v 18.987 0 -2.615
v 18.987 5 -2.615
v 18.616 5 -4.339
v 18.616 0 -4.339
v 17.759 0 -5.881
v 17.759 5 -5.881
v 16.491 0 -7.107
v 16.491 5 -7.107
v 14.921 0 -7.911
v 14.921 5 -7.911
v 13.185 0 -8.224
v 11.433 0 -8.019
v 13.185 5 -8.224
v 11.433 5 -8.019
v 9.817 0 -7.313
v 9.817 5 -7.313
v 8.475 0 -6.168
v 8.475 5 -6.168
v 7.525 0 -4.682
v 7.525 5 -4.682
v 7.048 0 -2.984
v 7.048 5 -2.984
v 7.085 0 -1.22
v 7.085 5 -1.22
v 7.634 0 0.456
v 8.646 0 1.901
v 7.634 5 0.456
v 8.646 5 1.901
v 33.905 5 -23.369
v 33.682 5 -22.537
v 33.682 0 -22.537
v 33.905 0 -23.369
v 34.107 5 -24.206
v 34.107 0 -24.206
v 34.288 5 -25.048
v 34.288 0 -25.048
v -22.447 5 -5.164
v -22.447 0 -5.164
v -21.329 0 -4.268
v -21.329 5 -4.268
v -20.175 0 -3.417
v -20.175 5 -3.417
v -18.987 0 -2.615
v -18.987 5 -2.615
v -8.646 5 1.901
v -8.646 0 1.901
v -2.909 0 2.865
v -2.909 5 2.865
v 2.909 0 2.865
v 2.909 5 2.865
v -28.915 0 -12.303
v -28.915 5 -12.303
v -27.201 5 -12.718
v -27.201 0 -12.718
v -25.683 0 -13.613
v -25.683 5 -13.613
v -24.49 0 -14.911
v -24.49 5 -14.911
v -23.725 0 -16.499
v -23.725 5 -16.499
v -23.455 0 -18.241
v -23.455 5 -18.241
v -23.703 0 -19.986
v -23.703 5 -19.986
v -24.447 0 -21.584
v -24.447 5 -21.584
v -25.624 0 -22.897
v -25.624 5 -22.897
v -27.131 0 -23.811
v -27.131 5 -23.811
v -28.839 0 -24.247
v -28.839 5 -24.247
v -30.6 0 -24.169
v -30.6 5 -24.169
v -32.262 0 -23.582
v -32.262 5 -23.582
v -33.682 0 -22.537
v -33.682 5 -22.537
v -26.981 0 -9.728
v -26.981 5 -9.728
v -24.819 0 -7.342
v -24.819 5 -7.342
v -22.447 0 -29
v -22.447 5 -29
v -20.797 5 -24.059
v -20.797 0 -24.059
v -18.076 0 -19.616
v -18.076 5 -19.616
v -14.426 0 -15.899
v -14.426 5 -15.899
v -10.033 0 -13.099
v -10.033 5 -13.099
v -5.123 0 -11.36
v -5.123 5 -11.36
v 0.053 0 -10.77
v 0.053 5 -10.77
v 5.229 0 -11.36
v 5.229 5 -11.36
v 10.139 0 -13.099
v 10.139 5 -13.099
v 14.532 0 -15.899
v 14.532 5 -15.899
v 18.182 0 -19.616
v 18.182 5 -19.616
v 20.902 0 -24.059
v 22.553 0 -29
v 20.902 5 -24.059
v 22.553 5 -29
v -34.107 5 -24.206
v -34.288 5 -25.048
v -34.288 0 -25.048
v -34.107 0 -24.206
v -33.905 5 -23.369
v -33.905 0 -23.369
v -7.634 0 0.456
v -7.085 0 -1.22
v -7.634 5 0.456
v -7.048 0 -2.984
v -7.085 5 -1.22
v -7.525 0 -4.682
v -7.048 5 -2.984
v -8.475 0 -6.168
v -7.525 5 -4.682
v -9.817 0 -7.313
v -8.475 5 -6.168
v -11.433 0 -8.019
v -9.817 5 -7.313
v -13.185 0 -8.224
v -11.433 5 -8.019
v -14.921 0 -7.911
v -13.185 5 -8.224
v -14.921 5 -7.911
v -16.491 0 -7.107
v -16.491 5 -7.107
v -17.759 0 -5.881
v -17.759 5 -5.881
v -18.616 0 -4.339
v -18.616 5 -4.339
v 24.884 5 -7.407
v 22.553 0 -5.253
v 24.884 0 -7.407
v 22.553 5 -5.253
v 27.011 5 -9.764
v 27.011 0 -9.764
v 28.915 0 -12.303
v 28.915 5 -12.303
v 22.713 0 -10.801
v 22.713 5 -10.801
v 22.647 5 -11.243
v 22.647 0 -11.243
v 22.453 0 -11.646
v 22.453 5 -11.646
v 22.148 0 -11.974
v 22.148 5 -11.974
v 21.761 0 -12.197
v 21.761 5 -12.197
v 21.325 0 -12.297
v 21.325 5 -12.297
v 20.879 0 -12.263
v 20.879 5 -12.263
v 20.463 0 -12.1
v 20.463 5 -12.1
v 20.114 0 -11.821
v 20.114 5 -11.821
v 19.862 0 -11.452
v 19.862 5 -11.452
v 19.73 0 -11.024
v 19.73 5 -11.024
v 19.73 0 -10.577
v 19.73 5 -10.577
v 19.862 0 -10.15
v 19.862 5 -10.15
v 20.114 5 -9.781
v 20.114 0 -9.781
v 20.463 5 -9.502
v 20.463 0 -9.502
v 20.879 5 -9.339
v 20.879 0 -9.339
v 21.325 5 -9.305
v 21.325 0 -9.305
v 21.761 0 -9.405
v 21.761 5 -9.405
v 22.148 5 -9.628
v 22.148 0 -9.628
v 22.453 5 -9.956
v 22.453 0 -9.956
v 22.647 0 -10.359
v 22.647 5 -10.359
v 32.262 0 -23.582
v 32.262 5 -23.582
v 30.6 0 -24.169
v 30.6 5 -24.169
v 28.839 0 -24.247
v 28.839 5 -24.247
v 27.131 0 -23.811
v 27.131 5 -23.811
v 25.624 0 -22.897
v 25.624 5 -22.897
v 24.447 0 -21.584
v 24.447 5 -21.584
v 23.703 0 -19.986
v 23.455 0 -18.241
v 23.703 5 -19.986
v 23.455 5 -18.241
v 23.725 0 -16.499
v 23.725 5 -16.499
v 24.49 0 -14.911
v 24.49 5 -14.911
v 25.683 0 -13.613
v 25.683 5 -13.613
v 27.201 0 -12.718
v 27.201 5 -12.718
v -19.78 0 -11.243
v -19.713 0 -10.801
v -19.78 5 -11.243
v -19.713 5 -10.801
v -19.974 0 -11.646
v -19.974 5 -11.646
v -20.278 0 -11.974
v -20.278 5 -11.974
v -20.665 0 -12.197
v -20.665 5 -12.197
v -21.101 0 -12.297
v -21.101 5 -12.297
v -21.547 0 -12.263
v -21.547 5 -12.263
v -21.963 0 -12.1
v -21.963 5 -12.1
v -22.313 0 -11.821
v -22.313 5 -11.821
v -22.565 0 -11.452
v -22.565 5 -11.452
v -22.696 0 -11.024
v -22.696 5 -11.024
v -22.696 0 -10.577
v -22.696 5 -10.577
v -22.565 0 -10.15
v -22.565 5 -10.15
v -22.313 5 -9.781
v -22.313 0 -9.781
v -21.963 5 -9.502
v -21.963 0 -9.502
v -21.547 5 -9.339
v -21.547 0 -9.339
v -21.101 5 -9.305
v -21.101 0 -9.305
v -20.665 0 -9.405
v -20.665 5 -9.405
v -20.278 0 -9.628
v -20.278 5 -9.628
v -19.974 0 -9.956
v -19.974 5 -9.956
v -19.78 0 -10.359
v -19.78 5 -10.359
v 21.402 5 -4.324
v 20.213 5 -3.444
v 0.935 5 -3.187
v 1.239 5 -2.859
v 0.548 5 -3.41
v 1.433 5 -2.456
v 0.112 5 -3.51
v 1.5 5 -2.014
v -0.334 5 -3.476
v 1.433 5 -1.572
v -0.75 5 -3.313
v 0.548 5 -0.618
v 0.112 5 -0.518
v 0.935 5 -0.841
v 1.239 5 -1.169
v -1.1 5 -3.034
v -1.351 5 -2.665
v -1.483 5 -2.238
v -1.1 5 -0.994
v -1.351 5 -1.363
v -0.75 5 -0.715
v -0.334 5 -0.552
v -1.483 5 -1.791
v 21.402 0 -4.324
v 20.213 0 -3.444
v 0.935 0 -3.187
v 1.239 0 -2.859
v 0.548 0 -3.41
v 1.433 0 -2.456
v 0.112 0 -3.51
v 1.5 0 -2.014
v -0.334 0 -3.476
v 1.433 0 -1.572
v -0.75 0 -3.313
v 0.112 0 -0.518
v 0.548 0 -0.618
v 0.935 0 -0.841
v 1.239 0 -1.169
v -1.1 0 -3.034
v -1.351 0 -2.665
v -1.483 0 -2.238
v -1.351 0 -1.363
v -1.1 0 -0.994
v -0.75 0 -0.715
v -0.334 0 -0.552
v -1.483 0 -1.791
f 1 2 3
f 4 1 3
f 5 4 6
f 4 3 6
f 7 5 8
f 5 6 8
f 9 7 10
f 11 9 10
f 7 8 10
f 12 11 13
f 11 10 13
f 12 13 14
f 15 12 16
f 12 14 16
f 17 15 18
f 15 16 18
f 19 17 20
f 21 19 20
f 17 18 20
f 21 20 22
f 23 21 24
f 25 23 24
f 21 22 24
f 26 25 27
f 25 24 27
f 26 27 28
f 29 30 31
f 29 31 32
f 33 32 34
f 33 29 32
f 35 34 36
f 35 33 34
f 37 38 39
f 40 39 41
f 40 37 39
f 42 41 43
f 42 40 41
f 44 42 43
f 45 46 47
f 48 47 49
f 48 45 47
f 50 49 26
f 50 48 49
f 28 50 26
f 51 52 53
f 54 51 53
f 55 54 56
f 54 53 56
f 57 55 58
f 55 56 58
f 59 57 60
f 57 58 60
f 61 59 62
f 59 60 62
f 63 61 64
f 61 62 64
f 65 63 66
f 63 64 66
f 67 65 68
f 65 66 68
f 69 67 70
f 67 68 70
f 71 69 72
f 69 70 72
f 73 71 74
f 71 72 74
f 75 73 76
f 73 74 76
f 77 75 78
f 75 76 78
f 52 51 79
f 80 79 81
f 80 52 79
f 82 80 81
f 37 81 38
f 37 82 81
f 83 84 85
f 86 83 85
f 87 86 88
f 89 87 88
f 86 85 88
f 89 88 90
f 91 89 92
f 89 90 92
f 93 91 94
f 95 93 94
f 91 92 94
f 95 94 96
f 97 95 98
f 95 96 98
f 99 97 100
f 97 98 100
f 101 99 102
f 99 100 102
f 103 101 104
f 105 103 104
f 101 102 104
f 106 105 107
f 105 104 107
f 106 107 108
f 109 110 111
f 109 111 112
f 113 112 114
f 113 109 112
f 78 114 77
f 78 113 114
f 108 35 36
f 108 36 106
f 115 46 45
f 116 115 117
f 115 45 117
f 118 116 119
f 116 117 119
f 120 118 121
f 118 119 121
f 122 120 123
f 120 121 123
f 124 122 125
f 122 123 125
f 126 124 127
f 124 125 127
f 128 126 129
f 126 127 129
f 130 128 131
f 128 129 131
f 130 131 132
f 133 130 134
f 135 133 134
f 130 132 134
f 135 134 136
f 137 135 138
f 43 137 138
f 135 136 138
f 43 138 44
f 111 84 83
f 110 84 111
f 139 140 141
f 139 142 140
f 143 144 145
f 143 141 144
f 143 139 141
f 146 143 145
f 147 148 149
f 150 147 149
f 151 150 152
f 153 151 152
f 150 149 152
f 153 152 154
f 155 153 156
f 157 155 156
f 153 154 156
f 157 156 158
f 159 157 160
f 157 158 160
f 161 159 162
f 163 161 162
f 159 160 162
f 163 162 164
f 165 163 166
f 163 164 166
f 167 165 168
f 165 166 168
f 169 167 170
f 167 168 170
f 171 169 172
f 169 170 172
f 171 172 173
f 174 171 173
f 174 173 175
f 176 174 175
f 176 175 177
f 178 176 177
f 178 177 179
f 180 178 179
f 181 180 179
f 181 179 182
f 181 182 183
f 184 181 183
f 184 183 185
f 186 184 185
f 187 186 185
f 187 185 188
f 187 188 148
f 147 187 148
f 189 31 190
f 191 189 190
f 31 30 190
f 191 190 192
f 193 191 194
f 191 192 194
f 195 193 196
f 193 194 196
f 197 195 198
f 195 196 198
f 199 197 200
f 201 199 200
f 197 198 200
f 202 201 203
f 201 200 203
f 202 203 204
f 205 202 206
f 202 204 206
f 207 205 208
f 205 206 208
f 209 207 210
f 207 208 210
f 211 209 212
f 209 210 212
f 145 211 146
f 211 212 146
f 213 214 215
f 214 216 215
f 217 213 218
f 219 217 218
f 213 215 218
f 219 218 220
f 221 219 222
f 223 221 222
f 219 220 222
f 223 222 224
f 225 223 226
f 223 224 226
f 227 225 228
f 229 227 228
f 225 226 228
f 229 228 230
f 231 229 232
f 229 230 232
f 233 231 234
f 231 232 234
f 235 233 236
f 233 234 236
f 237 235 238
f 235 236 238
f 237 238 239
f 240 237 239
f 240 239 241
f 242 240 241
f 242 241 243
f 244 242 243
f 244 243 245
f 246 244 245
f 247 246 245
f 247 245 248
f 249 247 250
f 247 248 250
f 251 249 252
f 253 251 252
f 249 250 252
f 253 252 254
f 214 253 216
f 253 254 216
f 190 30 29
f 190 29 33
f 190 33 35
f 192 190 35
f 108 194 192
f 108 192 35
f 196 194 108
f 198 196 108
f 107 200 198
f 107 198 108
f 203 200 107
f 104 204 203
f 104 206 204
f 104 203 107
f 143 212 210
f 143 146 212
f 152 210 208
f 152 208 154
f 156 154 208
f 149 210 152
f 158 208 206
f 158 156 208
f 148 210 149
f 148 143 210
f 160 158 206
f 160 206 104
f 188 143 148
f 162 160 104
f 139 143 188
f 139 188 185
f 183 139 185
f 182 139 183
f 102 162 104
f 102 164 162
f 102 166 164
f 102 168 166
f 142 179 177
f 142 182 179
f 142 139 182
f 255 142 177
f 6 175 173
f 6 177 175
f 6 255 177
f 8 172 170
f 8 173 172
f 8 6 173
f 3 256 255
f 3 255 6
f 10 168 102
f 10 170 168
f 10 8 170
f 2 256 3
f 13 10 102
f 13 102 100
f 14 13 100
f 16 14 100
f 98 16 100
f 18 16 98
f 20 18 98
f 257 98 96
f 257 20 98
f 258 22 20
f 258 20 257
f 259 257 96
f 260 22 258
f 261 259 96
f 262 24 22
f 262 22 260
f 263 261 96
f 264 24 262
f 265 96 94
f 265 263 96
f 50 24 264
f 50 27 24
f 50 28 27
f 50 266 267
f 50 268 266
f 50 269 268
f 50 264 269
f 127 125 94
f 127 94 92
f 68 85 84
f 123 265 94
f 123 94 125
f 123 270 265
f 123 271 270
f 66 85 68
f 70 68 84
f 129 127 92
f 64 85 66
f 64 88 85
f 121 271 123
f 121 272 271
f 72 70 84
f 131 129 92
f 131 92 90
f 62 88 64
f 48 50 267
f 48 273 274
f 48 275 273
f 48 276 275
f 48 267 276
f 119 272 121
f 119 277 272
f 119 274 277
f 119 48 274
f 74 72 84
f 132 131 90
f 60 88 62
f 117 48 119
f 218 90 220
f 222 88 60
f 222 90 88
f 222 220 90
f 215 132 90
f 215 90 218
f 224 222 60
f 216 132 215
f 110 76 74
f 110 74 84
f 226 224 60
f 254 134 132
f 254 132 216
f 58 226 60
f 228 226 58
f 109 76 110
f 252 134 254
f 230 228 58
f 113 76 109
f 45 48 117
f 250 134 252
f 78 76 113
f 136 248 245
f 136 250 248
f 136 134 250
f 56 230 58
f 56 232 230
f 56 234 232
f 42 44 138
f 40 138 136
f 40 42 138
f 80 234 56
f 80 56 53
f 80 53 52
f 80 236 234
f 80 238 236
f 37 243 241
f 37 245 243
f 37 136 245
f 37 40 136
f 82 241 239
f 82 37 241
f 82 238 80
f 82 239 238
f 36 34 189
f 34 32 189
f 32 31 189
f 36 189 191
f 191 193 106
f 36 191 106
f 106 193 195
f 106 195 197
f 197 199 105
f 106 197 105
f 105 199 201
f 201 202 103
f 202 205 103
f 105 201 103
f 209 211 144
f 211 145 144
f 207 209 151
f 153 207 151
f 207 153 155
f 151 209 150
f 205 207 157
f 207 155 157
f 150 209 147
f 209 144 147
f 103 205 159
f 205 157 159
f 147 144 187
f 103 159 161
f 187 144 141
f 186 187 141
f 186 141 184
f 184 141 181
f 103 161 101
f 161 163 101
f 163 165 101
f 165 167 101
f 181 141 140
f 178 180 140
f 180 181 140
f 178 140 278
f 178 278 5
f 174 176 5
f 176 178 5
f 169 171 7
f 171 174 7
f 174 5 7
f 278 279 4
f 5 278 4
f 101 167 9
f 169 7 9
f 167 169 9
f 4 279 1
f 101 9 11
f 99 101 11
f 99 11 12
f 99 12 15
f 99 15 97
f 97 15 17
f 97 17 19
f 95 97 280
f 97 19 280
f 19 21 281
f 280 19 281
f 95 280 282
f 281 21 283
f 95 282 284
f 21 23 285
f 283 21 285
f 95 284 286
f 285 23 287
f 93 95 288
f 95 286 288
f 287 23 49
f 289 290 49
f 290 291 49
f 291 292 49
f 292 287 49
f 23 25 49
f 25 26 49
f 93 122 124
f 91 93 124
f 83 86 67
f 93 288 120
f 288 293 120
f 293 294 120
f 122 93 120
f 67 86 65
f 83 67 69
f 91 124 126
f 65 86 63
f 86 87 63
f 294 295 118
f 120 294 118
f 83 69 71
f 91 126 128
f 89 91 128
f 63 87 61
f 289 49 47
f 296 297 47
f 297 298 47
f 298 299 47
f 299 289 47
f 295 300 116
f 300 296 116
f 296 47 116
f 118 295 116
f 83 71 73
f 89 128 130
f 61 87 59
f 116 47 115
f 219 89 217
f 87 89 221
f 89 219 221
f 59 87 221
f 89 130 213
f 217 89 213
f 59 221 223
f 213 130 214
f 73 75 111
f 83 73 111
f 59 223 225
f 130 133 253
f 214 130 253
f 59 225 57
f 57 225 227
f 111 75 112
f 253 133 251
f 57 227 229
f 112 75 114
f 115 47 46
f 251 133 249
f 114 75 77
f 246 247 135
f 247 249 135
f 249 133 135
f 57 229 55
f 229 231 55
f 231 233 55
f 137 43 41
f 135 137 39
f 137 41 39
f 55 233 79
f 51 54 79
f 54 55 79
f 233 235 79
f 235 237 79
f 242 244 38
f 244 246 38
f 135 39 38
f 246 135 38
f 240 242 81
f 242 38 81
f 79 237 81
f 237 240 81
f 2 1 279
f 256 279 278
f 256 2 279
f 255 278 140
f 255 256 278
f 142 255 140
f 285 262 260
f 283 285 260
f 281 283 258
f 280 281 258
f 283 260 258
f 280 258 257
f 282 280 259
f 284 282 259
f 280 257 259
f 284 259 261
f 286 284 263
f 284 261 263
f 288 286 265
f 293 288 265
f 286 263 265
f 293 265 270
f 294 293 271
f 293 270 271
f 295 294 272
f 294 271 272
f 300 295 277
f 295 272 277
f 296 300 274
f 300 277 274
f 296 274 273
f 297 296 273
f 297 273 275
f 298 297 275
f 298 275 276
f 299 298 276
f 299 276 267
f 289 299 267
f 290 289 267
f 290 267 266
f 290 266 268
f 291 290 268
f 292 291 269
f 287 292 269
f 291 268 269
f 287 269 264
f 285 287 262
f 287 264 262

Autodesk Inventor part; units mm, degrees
ref_plane "YZ Plane" through (0, 0, 0) normal (1, 0, 0) x (0, 1, 0)
ref_plane "XZ Plane" through (0, 0, 0) normal (0, 1, 0) x (-1, 0, 0)
ref_plane "XY Plane" through (0, 0, 0) normal (0, 0, 1) x (1, 0, 0)
sketch "Sketch1" plane through (0, 0, 0) normal (0, 1, 0) x (-1, 0, 0)
  line L0 (-22.5529, -44.0141) -> (22.4471, -44.0141)
  line L1 (-22.5529, -44.0141) -> (22.4471, -44.0141)
  line L2 (22.4471, 2.9859) -> (22.4471, -44.0141)
  line L3 (22.4471, 2.9859) -> (12.4471, 2.9859)
  line L4 (-22.5529, 2.9859) -> (-22.5529, -44.0141)
  line L5 (-22.5529, 2.9859) -> (-12.4471, 2.9859)
  arc A0 (-12.4471, 2.9859) -> (12.4471, 2.9859) centre (0, 4.1349) ccw
  circle A1 centre (-18.0529, -7.0141) radius 1.95
  circle A2 centre (-18.0529, -7.0141) radius 1.95
  circle A3 centre (17.9471, -7.0141) radius 1.95
  circle A4 centre (17.9471, -7.0141) radius 1.95
  circle A5 centre (0, -32.0141) radius 5.1
  circle A6 centre (-18.0529, -24.0142) radius 2
  circle A7 centre (-18, -40.0141) radius 2
  circle A8 centre (18, -40.0141) radius 2
  circle A9 centre (17.9471, -24.0142) radius 2
  line L6 (0, 4.1349) -> (0, -32.0141) construction
  point P0 (0, 0)
  dimension "d0" = 45
  dimension "d3" = 10
  dimension "d4" = 12.5
  dimension "d7" = 4.5
  dimension "d8" = 10
  dimension "d9" = 12
  dimension "d10" = 4
  dimension "d11" = 16
  dimension "d12" = 36
  dimension "d13" = 16
  dimension "d14" = 4.5
  dimension "d15" = 18
  dimension "d17" = 4.5
  dimension "d19" = 4
  dimension "d20" = 4
  dimension "d21" = 4
  dimension "d22" = 4
  dimension "d23" = 4
  dimension "d29" = 47
  dimension "d33" = 4.5
  dimension "d34" = 10
extrude "Extrusion1" add sketch "Sketch1" along normal blind 5
fillet "Fillet3" [suppressed]
fillet "Fillet4" [suppressed]
sketch "Sketch5" plane through (0, 5, 0) normal (0, 1, 0) x (1, 0, 0)
  arc A0 (12.4471, -2.9859) -> (-12.4471, -2.9859) centre (0, -4.1349) ccw projected
  arc A1 (12.4471, -2.9859) -> (-12.4471, -2.9859) centre (0, -4.1349) ccw
  line L0 (12.4471, -2.9859) -> (-12.4471, -2.9859)
  circle A2 centre (18.0529, 7.0141) radius 1.95 projected
  circle A3 centre (18.0529, 7.0141) radius 1.95
  circle A4 centre (-17.9471, 7.0141) radius 1.95 projected
  circle A5 centre (-17.9471, 7.0141) radius 1.95
  point P0 (0, 0)
extrude "Extrusion4" add sketch "Sketch5" against normal blind 5
sketch "Sketch8" plane through (0, 5, 0) normal (0, 1, 0) x (1, 0, 0)
  arc A0 (-25.3055, 28.046) -> (25.3055, 28.046) centre (0, 32) ccw
  arc A1 (-34.2883, 25.0481) -> (34.2883, 25.0481) centre (0, 32) ccw
  line L0 (-22.4471, -2.9859) -> (22.5529, -2.9859) projected
  line L1 (-22.4471, 44.0141) -> (-22.4471, -2.9859) projected
  line L2 (-22.4471, 29) -> (-34.2883, 25.0481)
  circle A2 centre (0, 32.0141) radius 5.1 projected
  line L3 (0, 32.0141) -> (0, 0) construction
  line L4 (-22.4471, 29) -> (-22.4471, 19.666)
  line L5 (34.2883, 25.0481) -> (22.5529, 29)
  line L6 (22.5529, -2.9859) -> (22.5529, 44.0141) projected
  line L7 (22.5529, 29) -> (22.5529, 19.8606)
extrude "Extrusion5" add sketch "Sketch8" against normal blind 5 contours L2 L1 A0 | A0 L1 A1 L2 | A0 L6 A1 L1 | L6 L5 A1
sketch "Sketch9" plane through (0, 5, 0) normal (0, 1, 0) x (1, 0, 0)
  circle A0 centre (0, 32) radius 34.9859
  line L0 (-22.4471, -2.9859) -> (22.5529, -2.9859) projected
  line L1 (22.5529, -2.9859) -> (22.5529, 5.2534) projected
  line L2 (22.5529, 5.2534) -> (22.5529, -2.9859)
  line L3 (22.5529, -2.9859) -> (-22.4471, -2.9859)
  line L4 (-22.4471, -2.9859) -> (-22.4471, 5.1645)
  point P0 (0, 0)
  point P1 (0, -2.9859)
sketch "Sketch6" plane through (0, 5, 0) normal (0, 1, 0) x (1, 0, 0)
  circle A0 centre (0, 32.0141) radius 5.1 projected
  circle A1 centre (0, 32.0141) radius 32.5 construction
  line L0 (0, 32.0141) -> (0, -0.4859) construction
  line L1 (0, 32.0141) -> (-13.7351, 2.5591) construction
  line L2 (0, 32.0141) -> (-29.455, 18.279) construction
  circle A2 centre (-13, 2.2273) radius 6
  circle A3 centre (-29.455, 18.279) radius 6
  circle A4 centre (13, 2.2273) radius 6
  circle A5 centre (29.455, 18.279) radius 6
  point P0 (0, 0)
  dimension "d49" = 65
  dimension "d50" = 12
  dimension "d51" = 12
  dimension "d52" = 25
  dimension "d53" = 40
extrude "Extrusion6" cut sketch "Sketch9" against normal blind 5 contours A0 L0 L4 | L1 L0 A0
extrude "Extrusion7" cut sketch "Sketch6" against normal blind 5 contours A2 | A3 | A4 | A5
sketch "Sketch10" plane through (0, 5, 0) normal (0, 1, 0) x (1, 0, 0)
  arc A0 (18.9875, 2.6148) -> (8.6459, -1.9008) centre (13, 2.2273) ccw projected
  circle A1 centre (13, 2.2273) radius 8.25 construction
  arc A2 (-8.6459, -1.9008) -> (-18.9875, 2.6148) centre (-13, 2.2273) ccw projected
  circle A3 centre (-13, 2.2273) radius 8.25 construction
  arc A4 (-28.9147, 12.3034) -> (-33.6819, 22.5373) centre (-29.455, 18.279) ccw projected
  circle A5 centre (-29.455, 18.279) radius 8.25 construction
  arc A6 (33.6819, 22.5373) -> (28.9147, 12.3034) centre (29.455, 18.279) ccw projected
  circle A7 centre (29.455, 18.279) radius 8.25 construction
  circle A8 centre (0, 32.0141) radius 5.1 projected
  circle A9 centre (0, 32.0141) radius 30 construction
  circle A10 centre (21.2132, 10.8009) radius 1.5
  circle A11 centre (0, 2.0141) radius 1.5
  circle A12 centre (-21.2132, 10.8009) radius 1.5
  line L0 (21.2132, 10.8009) -> (0, 32.0141) construction
  line L1 (0, 32.0141) -> (0, 2.0141) construction
  line L2 (0, 32.0141) -> (-21.2132, 10.8009) construction
  point P0 (0, 0)
  dimension "d60" = 16.5
  dimension "d61" = 16.5
  dimension "d62" = 16.5
  dimension "d63" = 16.5
  dimension "d64" = 60
  dimension "d65" = 3
  dimension "d66" = 3
  dimension "d67" = 3
  dimension "d68" = 45
extrude "Extrusion8" cut sketch "Sketch10" against normal blind 10 contours A10 | A11 | A12
sketch "Sketch11" plane through (0, 5, 0) normal (0, 1, 0) x (1, 0, 0)
  line L0 (22.5529, 29) -> (22.5529, 44.0141) projected
  arc A0 (-22.4471, 29) -> (22.5529, 29) centre (0.0529, 33.7697) ccw
  line L1 (22.5529, 29) -> (22.5529, 44.0141)
  line L2 (22.5529, 44.0141) -> (-22.4471, 44.0141) projected
  line L3 (-22.4471, 44.0141) -> (-22.4471, 29)
  point P0 (0, 0)
  dimension "d71" = 23
extrude "Extrusion9" cut sketch "Sketch11" against normal blind 10
properties part number "Plunger Holder"
